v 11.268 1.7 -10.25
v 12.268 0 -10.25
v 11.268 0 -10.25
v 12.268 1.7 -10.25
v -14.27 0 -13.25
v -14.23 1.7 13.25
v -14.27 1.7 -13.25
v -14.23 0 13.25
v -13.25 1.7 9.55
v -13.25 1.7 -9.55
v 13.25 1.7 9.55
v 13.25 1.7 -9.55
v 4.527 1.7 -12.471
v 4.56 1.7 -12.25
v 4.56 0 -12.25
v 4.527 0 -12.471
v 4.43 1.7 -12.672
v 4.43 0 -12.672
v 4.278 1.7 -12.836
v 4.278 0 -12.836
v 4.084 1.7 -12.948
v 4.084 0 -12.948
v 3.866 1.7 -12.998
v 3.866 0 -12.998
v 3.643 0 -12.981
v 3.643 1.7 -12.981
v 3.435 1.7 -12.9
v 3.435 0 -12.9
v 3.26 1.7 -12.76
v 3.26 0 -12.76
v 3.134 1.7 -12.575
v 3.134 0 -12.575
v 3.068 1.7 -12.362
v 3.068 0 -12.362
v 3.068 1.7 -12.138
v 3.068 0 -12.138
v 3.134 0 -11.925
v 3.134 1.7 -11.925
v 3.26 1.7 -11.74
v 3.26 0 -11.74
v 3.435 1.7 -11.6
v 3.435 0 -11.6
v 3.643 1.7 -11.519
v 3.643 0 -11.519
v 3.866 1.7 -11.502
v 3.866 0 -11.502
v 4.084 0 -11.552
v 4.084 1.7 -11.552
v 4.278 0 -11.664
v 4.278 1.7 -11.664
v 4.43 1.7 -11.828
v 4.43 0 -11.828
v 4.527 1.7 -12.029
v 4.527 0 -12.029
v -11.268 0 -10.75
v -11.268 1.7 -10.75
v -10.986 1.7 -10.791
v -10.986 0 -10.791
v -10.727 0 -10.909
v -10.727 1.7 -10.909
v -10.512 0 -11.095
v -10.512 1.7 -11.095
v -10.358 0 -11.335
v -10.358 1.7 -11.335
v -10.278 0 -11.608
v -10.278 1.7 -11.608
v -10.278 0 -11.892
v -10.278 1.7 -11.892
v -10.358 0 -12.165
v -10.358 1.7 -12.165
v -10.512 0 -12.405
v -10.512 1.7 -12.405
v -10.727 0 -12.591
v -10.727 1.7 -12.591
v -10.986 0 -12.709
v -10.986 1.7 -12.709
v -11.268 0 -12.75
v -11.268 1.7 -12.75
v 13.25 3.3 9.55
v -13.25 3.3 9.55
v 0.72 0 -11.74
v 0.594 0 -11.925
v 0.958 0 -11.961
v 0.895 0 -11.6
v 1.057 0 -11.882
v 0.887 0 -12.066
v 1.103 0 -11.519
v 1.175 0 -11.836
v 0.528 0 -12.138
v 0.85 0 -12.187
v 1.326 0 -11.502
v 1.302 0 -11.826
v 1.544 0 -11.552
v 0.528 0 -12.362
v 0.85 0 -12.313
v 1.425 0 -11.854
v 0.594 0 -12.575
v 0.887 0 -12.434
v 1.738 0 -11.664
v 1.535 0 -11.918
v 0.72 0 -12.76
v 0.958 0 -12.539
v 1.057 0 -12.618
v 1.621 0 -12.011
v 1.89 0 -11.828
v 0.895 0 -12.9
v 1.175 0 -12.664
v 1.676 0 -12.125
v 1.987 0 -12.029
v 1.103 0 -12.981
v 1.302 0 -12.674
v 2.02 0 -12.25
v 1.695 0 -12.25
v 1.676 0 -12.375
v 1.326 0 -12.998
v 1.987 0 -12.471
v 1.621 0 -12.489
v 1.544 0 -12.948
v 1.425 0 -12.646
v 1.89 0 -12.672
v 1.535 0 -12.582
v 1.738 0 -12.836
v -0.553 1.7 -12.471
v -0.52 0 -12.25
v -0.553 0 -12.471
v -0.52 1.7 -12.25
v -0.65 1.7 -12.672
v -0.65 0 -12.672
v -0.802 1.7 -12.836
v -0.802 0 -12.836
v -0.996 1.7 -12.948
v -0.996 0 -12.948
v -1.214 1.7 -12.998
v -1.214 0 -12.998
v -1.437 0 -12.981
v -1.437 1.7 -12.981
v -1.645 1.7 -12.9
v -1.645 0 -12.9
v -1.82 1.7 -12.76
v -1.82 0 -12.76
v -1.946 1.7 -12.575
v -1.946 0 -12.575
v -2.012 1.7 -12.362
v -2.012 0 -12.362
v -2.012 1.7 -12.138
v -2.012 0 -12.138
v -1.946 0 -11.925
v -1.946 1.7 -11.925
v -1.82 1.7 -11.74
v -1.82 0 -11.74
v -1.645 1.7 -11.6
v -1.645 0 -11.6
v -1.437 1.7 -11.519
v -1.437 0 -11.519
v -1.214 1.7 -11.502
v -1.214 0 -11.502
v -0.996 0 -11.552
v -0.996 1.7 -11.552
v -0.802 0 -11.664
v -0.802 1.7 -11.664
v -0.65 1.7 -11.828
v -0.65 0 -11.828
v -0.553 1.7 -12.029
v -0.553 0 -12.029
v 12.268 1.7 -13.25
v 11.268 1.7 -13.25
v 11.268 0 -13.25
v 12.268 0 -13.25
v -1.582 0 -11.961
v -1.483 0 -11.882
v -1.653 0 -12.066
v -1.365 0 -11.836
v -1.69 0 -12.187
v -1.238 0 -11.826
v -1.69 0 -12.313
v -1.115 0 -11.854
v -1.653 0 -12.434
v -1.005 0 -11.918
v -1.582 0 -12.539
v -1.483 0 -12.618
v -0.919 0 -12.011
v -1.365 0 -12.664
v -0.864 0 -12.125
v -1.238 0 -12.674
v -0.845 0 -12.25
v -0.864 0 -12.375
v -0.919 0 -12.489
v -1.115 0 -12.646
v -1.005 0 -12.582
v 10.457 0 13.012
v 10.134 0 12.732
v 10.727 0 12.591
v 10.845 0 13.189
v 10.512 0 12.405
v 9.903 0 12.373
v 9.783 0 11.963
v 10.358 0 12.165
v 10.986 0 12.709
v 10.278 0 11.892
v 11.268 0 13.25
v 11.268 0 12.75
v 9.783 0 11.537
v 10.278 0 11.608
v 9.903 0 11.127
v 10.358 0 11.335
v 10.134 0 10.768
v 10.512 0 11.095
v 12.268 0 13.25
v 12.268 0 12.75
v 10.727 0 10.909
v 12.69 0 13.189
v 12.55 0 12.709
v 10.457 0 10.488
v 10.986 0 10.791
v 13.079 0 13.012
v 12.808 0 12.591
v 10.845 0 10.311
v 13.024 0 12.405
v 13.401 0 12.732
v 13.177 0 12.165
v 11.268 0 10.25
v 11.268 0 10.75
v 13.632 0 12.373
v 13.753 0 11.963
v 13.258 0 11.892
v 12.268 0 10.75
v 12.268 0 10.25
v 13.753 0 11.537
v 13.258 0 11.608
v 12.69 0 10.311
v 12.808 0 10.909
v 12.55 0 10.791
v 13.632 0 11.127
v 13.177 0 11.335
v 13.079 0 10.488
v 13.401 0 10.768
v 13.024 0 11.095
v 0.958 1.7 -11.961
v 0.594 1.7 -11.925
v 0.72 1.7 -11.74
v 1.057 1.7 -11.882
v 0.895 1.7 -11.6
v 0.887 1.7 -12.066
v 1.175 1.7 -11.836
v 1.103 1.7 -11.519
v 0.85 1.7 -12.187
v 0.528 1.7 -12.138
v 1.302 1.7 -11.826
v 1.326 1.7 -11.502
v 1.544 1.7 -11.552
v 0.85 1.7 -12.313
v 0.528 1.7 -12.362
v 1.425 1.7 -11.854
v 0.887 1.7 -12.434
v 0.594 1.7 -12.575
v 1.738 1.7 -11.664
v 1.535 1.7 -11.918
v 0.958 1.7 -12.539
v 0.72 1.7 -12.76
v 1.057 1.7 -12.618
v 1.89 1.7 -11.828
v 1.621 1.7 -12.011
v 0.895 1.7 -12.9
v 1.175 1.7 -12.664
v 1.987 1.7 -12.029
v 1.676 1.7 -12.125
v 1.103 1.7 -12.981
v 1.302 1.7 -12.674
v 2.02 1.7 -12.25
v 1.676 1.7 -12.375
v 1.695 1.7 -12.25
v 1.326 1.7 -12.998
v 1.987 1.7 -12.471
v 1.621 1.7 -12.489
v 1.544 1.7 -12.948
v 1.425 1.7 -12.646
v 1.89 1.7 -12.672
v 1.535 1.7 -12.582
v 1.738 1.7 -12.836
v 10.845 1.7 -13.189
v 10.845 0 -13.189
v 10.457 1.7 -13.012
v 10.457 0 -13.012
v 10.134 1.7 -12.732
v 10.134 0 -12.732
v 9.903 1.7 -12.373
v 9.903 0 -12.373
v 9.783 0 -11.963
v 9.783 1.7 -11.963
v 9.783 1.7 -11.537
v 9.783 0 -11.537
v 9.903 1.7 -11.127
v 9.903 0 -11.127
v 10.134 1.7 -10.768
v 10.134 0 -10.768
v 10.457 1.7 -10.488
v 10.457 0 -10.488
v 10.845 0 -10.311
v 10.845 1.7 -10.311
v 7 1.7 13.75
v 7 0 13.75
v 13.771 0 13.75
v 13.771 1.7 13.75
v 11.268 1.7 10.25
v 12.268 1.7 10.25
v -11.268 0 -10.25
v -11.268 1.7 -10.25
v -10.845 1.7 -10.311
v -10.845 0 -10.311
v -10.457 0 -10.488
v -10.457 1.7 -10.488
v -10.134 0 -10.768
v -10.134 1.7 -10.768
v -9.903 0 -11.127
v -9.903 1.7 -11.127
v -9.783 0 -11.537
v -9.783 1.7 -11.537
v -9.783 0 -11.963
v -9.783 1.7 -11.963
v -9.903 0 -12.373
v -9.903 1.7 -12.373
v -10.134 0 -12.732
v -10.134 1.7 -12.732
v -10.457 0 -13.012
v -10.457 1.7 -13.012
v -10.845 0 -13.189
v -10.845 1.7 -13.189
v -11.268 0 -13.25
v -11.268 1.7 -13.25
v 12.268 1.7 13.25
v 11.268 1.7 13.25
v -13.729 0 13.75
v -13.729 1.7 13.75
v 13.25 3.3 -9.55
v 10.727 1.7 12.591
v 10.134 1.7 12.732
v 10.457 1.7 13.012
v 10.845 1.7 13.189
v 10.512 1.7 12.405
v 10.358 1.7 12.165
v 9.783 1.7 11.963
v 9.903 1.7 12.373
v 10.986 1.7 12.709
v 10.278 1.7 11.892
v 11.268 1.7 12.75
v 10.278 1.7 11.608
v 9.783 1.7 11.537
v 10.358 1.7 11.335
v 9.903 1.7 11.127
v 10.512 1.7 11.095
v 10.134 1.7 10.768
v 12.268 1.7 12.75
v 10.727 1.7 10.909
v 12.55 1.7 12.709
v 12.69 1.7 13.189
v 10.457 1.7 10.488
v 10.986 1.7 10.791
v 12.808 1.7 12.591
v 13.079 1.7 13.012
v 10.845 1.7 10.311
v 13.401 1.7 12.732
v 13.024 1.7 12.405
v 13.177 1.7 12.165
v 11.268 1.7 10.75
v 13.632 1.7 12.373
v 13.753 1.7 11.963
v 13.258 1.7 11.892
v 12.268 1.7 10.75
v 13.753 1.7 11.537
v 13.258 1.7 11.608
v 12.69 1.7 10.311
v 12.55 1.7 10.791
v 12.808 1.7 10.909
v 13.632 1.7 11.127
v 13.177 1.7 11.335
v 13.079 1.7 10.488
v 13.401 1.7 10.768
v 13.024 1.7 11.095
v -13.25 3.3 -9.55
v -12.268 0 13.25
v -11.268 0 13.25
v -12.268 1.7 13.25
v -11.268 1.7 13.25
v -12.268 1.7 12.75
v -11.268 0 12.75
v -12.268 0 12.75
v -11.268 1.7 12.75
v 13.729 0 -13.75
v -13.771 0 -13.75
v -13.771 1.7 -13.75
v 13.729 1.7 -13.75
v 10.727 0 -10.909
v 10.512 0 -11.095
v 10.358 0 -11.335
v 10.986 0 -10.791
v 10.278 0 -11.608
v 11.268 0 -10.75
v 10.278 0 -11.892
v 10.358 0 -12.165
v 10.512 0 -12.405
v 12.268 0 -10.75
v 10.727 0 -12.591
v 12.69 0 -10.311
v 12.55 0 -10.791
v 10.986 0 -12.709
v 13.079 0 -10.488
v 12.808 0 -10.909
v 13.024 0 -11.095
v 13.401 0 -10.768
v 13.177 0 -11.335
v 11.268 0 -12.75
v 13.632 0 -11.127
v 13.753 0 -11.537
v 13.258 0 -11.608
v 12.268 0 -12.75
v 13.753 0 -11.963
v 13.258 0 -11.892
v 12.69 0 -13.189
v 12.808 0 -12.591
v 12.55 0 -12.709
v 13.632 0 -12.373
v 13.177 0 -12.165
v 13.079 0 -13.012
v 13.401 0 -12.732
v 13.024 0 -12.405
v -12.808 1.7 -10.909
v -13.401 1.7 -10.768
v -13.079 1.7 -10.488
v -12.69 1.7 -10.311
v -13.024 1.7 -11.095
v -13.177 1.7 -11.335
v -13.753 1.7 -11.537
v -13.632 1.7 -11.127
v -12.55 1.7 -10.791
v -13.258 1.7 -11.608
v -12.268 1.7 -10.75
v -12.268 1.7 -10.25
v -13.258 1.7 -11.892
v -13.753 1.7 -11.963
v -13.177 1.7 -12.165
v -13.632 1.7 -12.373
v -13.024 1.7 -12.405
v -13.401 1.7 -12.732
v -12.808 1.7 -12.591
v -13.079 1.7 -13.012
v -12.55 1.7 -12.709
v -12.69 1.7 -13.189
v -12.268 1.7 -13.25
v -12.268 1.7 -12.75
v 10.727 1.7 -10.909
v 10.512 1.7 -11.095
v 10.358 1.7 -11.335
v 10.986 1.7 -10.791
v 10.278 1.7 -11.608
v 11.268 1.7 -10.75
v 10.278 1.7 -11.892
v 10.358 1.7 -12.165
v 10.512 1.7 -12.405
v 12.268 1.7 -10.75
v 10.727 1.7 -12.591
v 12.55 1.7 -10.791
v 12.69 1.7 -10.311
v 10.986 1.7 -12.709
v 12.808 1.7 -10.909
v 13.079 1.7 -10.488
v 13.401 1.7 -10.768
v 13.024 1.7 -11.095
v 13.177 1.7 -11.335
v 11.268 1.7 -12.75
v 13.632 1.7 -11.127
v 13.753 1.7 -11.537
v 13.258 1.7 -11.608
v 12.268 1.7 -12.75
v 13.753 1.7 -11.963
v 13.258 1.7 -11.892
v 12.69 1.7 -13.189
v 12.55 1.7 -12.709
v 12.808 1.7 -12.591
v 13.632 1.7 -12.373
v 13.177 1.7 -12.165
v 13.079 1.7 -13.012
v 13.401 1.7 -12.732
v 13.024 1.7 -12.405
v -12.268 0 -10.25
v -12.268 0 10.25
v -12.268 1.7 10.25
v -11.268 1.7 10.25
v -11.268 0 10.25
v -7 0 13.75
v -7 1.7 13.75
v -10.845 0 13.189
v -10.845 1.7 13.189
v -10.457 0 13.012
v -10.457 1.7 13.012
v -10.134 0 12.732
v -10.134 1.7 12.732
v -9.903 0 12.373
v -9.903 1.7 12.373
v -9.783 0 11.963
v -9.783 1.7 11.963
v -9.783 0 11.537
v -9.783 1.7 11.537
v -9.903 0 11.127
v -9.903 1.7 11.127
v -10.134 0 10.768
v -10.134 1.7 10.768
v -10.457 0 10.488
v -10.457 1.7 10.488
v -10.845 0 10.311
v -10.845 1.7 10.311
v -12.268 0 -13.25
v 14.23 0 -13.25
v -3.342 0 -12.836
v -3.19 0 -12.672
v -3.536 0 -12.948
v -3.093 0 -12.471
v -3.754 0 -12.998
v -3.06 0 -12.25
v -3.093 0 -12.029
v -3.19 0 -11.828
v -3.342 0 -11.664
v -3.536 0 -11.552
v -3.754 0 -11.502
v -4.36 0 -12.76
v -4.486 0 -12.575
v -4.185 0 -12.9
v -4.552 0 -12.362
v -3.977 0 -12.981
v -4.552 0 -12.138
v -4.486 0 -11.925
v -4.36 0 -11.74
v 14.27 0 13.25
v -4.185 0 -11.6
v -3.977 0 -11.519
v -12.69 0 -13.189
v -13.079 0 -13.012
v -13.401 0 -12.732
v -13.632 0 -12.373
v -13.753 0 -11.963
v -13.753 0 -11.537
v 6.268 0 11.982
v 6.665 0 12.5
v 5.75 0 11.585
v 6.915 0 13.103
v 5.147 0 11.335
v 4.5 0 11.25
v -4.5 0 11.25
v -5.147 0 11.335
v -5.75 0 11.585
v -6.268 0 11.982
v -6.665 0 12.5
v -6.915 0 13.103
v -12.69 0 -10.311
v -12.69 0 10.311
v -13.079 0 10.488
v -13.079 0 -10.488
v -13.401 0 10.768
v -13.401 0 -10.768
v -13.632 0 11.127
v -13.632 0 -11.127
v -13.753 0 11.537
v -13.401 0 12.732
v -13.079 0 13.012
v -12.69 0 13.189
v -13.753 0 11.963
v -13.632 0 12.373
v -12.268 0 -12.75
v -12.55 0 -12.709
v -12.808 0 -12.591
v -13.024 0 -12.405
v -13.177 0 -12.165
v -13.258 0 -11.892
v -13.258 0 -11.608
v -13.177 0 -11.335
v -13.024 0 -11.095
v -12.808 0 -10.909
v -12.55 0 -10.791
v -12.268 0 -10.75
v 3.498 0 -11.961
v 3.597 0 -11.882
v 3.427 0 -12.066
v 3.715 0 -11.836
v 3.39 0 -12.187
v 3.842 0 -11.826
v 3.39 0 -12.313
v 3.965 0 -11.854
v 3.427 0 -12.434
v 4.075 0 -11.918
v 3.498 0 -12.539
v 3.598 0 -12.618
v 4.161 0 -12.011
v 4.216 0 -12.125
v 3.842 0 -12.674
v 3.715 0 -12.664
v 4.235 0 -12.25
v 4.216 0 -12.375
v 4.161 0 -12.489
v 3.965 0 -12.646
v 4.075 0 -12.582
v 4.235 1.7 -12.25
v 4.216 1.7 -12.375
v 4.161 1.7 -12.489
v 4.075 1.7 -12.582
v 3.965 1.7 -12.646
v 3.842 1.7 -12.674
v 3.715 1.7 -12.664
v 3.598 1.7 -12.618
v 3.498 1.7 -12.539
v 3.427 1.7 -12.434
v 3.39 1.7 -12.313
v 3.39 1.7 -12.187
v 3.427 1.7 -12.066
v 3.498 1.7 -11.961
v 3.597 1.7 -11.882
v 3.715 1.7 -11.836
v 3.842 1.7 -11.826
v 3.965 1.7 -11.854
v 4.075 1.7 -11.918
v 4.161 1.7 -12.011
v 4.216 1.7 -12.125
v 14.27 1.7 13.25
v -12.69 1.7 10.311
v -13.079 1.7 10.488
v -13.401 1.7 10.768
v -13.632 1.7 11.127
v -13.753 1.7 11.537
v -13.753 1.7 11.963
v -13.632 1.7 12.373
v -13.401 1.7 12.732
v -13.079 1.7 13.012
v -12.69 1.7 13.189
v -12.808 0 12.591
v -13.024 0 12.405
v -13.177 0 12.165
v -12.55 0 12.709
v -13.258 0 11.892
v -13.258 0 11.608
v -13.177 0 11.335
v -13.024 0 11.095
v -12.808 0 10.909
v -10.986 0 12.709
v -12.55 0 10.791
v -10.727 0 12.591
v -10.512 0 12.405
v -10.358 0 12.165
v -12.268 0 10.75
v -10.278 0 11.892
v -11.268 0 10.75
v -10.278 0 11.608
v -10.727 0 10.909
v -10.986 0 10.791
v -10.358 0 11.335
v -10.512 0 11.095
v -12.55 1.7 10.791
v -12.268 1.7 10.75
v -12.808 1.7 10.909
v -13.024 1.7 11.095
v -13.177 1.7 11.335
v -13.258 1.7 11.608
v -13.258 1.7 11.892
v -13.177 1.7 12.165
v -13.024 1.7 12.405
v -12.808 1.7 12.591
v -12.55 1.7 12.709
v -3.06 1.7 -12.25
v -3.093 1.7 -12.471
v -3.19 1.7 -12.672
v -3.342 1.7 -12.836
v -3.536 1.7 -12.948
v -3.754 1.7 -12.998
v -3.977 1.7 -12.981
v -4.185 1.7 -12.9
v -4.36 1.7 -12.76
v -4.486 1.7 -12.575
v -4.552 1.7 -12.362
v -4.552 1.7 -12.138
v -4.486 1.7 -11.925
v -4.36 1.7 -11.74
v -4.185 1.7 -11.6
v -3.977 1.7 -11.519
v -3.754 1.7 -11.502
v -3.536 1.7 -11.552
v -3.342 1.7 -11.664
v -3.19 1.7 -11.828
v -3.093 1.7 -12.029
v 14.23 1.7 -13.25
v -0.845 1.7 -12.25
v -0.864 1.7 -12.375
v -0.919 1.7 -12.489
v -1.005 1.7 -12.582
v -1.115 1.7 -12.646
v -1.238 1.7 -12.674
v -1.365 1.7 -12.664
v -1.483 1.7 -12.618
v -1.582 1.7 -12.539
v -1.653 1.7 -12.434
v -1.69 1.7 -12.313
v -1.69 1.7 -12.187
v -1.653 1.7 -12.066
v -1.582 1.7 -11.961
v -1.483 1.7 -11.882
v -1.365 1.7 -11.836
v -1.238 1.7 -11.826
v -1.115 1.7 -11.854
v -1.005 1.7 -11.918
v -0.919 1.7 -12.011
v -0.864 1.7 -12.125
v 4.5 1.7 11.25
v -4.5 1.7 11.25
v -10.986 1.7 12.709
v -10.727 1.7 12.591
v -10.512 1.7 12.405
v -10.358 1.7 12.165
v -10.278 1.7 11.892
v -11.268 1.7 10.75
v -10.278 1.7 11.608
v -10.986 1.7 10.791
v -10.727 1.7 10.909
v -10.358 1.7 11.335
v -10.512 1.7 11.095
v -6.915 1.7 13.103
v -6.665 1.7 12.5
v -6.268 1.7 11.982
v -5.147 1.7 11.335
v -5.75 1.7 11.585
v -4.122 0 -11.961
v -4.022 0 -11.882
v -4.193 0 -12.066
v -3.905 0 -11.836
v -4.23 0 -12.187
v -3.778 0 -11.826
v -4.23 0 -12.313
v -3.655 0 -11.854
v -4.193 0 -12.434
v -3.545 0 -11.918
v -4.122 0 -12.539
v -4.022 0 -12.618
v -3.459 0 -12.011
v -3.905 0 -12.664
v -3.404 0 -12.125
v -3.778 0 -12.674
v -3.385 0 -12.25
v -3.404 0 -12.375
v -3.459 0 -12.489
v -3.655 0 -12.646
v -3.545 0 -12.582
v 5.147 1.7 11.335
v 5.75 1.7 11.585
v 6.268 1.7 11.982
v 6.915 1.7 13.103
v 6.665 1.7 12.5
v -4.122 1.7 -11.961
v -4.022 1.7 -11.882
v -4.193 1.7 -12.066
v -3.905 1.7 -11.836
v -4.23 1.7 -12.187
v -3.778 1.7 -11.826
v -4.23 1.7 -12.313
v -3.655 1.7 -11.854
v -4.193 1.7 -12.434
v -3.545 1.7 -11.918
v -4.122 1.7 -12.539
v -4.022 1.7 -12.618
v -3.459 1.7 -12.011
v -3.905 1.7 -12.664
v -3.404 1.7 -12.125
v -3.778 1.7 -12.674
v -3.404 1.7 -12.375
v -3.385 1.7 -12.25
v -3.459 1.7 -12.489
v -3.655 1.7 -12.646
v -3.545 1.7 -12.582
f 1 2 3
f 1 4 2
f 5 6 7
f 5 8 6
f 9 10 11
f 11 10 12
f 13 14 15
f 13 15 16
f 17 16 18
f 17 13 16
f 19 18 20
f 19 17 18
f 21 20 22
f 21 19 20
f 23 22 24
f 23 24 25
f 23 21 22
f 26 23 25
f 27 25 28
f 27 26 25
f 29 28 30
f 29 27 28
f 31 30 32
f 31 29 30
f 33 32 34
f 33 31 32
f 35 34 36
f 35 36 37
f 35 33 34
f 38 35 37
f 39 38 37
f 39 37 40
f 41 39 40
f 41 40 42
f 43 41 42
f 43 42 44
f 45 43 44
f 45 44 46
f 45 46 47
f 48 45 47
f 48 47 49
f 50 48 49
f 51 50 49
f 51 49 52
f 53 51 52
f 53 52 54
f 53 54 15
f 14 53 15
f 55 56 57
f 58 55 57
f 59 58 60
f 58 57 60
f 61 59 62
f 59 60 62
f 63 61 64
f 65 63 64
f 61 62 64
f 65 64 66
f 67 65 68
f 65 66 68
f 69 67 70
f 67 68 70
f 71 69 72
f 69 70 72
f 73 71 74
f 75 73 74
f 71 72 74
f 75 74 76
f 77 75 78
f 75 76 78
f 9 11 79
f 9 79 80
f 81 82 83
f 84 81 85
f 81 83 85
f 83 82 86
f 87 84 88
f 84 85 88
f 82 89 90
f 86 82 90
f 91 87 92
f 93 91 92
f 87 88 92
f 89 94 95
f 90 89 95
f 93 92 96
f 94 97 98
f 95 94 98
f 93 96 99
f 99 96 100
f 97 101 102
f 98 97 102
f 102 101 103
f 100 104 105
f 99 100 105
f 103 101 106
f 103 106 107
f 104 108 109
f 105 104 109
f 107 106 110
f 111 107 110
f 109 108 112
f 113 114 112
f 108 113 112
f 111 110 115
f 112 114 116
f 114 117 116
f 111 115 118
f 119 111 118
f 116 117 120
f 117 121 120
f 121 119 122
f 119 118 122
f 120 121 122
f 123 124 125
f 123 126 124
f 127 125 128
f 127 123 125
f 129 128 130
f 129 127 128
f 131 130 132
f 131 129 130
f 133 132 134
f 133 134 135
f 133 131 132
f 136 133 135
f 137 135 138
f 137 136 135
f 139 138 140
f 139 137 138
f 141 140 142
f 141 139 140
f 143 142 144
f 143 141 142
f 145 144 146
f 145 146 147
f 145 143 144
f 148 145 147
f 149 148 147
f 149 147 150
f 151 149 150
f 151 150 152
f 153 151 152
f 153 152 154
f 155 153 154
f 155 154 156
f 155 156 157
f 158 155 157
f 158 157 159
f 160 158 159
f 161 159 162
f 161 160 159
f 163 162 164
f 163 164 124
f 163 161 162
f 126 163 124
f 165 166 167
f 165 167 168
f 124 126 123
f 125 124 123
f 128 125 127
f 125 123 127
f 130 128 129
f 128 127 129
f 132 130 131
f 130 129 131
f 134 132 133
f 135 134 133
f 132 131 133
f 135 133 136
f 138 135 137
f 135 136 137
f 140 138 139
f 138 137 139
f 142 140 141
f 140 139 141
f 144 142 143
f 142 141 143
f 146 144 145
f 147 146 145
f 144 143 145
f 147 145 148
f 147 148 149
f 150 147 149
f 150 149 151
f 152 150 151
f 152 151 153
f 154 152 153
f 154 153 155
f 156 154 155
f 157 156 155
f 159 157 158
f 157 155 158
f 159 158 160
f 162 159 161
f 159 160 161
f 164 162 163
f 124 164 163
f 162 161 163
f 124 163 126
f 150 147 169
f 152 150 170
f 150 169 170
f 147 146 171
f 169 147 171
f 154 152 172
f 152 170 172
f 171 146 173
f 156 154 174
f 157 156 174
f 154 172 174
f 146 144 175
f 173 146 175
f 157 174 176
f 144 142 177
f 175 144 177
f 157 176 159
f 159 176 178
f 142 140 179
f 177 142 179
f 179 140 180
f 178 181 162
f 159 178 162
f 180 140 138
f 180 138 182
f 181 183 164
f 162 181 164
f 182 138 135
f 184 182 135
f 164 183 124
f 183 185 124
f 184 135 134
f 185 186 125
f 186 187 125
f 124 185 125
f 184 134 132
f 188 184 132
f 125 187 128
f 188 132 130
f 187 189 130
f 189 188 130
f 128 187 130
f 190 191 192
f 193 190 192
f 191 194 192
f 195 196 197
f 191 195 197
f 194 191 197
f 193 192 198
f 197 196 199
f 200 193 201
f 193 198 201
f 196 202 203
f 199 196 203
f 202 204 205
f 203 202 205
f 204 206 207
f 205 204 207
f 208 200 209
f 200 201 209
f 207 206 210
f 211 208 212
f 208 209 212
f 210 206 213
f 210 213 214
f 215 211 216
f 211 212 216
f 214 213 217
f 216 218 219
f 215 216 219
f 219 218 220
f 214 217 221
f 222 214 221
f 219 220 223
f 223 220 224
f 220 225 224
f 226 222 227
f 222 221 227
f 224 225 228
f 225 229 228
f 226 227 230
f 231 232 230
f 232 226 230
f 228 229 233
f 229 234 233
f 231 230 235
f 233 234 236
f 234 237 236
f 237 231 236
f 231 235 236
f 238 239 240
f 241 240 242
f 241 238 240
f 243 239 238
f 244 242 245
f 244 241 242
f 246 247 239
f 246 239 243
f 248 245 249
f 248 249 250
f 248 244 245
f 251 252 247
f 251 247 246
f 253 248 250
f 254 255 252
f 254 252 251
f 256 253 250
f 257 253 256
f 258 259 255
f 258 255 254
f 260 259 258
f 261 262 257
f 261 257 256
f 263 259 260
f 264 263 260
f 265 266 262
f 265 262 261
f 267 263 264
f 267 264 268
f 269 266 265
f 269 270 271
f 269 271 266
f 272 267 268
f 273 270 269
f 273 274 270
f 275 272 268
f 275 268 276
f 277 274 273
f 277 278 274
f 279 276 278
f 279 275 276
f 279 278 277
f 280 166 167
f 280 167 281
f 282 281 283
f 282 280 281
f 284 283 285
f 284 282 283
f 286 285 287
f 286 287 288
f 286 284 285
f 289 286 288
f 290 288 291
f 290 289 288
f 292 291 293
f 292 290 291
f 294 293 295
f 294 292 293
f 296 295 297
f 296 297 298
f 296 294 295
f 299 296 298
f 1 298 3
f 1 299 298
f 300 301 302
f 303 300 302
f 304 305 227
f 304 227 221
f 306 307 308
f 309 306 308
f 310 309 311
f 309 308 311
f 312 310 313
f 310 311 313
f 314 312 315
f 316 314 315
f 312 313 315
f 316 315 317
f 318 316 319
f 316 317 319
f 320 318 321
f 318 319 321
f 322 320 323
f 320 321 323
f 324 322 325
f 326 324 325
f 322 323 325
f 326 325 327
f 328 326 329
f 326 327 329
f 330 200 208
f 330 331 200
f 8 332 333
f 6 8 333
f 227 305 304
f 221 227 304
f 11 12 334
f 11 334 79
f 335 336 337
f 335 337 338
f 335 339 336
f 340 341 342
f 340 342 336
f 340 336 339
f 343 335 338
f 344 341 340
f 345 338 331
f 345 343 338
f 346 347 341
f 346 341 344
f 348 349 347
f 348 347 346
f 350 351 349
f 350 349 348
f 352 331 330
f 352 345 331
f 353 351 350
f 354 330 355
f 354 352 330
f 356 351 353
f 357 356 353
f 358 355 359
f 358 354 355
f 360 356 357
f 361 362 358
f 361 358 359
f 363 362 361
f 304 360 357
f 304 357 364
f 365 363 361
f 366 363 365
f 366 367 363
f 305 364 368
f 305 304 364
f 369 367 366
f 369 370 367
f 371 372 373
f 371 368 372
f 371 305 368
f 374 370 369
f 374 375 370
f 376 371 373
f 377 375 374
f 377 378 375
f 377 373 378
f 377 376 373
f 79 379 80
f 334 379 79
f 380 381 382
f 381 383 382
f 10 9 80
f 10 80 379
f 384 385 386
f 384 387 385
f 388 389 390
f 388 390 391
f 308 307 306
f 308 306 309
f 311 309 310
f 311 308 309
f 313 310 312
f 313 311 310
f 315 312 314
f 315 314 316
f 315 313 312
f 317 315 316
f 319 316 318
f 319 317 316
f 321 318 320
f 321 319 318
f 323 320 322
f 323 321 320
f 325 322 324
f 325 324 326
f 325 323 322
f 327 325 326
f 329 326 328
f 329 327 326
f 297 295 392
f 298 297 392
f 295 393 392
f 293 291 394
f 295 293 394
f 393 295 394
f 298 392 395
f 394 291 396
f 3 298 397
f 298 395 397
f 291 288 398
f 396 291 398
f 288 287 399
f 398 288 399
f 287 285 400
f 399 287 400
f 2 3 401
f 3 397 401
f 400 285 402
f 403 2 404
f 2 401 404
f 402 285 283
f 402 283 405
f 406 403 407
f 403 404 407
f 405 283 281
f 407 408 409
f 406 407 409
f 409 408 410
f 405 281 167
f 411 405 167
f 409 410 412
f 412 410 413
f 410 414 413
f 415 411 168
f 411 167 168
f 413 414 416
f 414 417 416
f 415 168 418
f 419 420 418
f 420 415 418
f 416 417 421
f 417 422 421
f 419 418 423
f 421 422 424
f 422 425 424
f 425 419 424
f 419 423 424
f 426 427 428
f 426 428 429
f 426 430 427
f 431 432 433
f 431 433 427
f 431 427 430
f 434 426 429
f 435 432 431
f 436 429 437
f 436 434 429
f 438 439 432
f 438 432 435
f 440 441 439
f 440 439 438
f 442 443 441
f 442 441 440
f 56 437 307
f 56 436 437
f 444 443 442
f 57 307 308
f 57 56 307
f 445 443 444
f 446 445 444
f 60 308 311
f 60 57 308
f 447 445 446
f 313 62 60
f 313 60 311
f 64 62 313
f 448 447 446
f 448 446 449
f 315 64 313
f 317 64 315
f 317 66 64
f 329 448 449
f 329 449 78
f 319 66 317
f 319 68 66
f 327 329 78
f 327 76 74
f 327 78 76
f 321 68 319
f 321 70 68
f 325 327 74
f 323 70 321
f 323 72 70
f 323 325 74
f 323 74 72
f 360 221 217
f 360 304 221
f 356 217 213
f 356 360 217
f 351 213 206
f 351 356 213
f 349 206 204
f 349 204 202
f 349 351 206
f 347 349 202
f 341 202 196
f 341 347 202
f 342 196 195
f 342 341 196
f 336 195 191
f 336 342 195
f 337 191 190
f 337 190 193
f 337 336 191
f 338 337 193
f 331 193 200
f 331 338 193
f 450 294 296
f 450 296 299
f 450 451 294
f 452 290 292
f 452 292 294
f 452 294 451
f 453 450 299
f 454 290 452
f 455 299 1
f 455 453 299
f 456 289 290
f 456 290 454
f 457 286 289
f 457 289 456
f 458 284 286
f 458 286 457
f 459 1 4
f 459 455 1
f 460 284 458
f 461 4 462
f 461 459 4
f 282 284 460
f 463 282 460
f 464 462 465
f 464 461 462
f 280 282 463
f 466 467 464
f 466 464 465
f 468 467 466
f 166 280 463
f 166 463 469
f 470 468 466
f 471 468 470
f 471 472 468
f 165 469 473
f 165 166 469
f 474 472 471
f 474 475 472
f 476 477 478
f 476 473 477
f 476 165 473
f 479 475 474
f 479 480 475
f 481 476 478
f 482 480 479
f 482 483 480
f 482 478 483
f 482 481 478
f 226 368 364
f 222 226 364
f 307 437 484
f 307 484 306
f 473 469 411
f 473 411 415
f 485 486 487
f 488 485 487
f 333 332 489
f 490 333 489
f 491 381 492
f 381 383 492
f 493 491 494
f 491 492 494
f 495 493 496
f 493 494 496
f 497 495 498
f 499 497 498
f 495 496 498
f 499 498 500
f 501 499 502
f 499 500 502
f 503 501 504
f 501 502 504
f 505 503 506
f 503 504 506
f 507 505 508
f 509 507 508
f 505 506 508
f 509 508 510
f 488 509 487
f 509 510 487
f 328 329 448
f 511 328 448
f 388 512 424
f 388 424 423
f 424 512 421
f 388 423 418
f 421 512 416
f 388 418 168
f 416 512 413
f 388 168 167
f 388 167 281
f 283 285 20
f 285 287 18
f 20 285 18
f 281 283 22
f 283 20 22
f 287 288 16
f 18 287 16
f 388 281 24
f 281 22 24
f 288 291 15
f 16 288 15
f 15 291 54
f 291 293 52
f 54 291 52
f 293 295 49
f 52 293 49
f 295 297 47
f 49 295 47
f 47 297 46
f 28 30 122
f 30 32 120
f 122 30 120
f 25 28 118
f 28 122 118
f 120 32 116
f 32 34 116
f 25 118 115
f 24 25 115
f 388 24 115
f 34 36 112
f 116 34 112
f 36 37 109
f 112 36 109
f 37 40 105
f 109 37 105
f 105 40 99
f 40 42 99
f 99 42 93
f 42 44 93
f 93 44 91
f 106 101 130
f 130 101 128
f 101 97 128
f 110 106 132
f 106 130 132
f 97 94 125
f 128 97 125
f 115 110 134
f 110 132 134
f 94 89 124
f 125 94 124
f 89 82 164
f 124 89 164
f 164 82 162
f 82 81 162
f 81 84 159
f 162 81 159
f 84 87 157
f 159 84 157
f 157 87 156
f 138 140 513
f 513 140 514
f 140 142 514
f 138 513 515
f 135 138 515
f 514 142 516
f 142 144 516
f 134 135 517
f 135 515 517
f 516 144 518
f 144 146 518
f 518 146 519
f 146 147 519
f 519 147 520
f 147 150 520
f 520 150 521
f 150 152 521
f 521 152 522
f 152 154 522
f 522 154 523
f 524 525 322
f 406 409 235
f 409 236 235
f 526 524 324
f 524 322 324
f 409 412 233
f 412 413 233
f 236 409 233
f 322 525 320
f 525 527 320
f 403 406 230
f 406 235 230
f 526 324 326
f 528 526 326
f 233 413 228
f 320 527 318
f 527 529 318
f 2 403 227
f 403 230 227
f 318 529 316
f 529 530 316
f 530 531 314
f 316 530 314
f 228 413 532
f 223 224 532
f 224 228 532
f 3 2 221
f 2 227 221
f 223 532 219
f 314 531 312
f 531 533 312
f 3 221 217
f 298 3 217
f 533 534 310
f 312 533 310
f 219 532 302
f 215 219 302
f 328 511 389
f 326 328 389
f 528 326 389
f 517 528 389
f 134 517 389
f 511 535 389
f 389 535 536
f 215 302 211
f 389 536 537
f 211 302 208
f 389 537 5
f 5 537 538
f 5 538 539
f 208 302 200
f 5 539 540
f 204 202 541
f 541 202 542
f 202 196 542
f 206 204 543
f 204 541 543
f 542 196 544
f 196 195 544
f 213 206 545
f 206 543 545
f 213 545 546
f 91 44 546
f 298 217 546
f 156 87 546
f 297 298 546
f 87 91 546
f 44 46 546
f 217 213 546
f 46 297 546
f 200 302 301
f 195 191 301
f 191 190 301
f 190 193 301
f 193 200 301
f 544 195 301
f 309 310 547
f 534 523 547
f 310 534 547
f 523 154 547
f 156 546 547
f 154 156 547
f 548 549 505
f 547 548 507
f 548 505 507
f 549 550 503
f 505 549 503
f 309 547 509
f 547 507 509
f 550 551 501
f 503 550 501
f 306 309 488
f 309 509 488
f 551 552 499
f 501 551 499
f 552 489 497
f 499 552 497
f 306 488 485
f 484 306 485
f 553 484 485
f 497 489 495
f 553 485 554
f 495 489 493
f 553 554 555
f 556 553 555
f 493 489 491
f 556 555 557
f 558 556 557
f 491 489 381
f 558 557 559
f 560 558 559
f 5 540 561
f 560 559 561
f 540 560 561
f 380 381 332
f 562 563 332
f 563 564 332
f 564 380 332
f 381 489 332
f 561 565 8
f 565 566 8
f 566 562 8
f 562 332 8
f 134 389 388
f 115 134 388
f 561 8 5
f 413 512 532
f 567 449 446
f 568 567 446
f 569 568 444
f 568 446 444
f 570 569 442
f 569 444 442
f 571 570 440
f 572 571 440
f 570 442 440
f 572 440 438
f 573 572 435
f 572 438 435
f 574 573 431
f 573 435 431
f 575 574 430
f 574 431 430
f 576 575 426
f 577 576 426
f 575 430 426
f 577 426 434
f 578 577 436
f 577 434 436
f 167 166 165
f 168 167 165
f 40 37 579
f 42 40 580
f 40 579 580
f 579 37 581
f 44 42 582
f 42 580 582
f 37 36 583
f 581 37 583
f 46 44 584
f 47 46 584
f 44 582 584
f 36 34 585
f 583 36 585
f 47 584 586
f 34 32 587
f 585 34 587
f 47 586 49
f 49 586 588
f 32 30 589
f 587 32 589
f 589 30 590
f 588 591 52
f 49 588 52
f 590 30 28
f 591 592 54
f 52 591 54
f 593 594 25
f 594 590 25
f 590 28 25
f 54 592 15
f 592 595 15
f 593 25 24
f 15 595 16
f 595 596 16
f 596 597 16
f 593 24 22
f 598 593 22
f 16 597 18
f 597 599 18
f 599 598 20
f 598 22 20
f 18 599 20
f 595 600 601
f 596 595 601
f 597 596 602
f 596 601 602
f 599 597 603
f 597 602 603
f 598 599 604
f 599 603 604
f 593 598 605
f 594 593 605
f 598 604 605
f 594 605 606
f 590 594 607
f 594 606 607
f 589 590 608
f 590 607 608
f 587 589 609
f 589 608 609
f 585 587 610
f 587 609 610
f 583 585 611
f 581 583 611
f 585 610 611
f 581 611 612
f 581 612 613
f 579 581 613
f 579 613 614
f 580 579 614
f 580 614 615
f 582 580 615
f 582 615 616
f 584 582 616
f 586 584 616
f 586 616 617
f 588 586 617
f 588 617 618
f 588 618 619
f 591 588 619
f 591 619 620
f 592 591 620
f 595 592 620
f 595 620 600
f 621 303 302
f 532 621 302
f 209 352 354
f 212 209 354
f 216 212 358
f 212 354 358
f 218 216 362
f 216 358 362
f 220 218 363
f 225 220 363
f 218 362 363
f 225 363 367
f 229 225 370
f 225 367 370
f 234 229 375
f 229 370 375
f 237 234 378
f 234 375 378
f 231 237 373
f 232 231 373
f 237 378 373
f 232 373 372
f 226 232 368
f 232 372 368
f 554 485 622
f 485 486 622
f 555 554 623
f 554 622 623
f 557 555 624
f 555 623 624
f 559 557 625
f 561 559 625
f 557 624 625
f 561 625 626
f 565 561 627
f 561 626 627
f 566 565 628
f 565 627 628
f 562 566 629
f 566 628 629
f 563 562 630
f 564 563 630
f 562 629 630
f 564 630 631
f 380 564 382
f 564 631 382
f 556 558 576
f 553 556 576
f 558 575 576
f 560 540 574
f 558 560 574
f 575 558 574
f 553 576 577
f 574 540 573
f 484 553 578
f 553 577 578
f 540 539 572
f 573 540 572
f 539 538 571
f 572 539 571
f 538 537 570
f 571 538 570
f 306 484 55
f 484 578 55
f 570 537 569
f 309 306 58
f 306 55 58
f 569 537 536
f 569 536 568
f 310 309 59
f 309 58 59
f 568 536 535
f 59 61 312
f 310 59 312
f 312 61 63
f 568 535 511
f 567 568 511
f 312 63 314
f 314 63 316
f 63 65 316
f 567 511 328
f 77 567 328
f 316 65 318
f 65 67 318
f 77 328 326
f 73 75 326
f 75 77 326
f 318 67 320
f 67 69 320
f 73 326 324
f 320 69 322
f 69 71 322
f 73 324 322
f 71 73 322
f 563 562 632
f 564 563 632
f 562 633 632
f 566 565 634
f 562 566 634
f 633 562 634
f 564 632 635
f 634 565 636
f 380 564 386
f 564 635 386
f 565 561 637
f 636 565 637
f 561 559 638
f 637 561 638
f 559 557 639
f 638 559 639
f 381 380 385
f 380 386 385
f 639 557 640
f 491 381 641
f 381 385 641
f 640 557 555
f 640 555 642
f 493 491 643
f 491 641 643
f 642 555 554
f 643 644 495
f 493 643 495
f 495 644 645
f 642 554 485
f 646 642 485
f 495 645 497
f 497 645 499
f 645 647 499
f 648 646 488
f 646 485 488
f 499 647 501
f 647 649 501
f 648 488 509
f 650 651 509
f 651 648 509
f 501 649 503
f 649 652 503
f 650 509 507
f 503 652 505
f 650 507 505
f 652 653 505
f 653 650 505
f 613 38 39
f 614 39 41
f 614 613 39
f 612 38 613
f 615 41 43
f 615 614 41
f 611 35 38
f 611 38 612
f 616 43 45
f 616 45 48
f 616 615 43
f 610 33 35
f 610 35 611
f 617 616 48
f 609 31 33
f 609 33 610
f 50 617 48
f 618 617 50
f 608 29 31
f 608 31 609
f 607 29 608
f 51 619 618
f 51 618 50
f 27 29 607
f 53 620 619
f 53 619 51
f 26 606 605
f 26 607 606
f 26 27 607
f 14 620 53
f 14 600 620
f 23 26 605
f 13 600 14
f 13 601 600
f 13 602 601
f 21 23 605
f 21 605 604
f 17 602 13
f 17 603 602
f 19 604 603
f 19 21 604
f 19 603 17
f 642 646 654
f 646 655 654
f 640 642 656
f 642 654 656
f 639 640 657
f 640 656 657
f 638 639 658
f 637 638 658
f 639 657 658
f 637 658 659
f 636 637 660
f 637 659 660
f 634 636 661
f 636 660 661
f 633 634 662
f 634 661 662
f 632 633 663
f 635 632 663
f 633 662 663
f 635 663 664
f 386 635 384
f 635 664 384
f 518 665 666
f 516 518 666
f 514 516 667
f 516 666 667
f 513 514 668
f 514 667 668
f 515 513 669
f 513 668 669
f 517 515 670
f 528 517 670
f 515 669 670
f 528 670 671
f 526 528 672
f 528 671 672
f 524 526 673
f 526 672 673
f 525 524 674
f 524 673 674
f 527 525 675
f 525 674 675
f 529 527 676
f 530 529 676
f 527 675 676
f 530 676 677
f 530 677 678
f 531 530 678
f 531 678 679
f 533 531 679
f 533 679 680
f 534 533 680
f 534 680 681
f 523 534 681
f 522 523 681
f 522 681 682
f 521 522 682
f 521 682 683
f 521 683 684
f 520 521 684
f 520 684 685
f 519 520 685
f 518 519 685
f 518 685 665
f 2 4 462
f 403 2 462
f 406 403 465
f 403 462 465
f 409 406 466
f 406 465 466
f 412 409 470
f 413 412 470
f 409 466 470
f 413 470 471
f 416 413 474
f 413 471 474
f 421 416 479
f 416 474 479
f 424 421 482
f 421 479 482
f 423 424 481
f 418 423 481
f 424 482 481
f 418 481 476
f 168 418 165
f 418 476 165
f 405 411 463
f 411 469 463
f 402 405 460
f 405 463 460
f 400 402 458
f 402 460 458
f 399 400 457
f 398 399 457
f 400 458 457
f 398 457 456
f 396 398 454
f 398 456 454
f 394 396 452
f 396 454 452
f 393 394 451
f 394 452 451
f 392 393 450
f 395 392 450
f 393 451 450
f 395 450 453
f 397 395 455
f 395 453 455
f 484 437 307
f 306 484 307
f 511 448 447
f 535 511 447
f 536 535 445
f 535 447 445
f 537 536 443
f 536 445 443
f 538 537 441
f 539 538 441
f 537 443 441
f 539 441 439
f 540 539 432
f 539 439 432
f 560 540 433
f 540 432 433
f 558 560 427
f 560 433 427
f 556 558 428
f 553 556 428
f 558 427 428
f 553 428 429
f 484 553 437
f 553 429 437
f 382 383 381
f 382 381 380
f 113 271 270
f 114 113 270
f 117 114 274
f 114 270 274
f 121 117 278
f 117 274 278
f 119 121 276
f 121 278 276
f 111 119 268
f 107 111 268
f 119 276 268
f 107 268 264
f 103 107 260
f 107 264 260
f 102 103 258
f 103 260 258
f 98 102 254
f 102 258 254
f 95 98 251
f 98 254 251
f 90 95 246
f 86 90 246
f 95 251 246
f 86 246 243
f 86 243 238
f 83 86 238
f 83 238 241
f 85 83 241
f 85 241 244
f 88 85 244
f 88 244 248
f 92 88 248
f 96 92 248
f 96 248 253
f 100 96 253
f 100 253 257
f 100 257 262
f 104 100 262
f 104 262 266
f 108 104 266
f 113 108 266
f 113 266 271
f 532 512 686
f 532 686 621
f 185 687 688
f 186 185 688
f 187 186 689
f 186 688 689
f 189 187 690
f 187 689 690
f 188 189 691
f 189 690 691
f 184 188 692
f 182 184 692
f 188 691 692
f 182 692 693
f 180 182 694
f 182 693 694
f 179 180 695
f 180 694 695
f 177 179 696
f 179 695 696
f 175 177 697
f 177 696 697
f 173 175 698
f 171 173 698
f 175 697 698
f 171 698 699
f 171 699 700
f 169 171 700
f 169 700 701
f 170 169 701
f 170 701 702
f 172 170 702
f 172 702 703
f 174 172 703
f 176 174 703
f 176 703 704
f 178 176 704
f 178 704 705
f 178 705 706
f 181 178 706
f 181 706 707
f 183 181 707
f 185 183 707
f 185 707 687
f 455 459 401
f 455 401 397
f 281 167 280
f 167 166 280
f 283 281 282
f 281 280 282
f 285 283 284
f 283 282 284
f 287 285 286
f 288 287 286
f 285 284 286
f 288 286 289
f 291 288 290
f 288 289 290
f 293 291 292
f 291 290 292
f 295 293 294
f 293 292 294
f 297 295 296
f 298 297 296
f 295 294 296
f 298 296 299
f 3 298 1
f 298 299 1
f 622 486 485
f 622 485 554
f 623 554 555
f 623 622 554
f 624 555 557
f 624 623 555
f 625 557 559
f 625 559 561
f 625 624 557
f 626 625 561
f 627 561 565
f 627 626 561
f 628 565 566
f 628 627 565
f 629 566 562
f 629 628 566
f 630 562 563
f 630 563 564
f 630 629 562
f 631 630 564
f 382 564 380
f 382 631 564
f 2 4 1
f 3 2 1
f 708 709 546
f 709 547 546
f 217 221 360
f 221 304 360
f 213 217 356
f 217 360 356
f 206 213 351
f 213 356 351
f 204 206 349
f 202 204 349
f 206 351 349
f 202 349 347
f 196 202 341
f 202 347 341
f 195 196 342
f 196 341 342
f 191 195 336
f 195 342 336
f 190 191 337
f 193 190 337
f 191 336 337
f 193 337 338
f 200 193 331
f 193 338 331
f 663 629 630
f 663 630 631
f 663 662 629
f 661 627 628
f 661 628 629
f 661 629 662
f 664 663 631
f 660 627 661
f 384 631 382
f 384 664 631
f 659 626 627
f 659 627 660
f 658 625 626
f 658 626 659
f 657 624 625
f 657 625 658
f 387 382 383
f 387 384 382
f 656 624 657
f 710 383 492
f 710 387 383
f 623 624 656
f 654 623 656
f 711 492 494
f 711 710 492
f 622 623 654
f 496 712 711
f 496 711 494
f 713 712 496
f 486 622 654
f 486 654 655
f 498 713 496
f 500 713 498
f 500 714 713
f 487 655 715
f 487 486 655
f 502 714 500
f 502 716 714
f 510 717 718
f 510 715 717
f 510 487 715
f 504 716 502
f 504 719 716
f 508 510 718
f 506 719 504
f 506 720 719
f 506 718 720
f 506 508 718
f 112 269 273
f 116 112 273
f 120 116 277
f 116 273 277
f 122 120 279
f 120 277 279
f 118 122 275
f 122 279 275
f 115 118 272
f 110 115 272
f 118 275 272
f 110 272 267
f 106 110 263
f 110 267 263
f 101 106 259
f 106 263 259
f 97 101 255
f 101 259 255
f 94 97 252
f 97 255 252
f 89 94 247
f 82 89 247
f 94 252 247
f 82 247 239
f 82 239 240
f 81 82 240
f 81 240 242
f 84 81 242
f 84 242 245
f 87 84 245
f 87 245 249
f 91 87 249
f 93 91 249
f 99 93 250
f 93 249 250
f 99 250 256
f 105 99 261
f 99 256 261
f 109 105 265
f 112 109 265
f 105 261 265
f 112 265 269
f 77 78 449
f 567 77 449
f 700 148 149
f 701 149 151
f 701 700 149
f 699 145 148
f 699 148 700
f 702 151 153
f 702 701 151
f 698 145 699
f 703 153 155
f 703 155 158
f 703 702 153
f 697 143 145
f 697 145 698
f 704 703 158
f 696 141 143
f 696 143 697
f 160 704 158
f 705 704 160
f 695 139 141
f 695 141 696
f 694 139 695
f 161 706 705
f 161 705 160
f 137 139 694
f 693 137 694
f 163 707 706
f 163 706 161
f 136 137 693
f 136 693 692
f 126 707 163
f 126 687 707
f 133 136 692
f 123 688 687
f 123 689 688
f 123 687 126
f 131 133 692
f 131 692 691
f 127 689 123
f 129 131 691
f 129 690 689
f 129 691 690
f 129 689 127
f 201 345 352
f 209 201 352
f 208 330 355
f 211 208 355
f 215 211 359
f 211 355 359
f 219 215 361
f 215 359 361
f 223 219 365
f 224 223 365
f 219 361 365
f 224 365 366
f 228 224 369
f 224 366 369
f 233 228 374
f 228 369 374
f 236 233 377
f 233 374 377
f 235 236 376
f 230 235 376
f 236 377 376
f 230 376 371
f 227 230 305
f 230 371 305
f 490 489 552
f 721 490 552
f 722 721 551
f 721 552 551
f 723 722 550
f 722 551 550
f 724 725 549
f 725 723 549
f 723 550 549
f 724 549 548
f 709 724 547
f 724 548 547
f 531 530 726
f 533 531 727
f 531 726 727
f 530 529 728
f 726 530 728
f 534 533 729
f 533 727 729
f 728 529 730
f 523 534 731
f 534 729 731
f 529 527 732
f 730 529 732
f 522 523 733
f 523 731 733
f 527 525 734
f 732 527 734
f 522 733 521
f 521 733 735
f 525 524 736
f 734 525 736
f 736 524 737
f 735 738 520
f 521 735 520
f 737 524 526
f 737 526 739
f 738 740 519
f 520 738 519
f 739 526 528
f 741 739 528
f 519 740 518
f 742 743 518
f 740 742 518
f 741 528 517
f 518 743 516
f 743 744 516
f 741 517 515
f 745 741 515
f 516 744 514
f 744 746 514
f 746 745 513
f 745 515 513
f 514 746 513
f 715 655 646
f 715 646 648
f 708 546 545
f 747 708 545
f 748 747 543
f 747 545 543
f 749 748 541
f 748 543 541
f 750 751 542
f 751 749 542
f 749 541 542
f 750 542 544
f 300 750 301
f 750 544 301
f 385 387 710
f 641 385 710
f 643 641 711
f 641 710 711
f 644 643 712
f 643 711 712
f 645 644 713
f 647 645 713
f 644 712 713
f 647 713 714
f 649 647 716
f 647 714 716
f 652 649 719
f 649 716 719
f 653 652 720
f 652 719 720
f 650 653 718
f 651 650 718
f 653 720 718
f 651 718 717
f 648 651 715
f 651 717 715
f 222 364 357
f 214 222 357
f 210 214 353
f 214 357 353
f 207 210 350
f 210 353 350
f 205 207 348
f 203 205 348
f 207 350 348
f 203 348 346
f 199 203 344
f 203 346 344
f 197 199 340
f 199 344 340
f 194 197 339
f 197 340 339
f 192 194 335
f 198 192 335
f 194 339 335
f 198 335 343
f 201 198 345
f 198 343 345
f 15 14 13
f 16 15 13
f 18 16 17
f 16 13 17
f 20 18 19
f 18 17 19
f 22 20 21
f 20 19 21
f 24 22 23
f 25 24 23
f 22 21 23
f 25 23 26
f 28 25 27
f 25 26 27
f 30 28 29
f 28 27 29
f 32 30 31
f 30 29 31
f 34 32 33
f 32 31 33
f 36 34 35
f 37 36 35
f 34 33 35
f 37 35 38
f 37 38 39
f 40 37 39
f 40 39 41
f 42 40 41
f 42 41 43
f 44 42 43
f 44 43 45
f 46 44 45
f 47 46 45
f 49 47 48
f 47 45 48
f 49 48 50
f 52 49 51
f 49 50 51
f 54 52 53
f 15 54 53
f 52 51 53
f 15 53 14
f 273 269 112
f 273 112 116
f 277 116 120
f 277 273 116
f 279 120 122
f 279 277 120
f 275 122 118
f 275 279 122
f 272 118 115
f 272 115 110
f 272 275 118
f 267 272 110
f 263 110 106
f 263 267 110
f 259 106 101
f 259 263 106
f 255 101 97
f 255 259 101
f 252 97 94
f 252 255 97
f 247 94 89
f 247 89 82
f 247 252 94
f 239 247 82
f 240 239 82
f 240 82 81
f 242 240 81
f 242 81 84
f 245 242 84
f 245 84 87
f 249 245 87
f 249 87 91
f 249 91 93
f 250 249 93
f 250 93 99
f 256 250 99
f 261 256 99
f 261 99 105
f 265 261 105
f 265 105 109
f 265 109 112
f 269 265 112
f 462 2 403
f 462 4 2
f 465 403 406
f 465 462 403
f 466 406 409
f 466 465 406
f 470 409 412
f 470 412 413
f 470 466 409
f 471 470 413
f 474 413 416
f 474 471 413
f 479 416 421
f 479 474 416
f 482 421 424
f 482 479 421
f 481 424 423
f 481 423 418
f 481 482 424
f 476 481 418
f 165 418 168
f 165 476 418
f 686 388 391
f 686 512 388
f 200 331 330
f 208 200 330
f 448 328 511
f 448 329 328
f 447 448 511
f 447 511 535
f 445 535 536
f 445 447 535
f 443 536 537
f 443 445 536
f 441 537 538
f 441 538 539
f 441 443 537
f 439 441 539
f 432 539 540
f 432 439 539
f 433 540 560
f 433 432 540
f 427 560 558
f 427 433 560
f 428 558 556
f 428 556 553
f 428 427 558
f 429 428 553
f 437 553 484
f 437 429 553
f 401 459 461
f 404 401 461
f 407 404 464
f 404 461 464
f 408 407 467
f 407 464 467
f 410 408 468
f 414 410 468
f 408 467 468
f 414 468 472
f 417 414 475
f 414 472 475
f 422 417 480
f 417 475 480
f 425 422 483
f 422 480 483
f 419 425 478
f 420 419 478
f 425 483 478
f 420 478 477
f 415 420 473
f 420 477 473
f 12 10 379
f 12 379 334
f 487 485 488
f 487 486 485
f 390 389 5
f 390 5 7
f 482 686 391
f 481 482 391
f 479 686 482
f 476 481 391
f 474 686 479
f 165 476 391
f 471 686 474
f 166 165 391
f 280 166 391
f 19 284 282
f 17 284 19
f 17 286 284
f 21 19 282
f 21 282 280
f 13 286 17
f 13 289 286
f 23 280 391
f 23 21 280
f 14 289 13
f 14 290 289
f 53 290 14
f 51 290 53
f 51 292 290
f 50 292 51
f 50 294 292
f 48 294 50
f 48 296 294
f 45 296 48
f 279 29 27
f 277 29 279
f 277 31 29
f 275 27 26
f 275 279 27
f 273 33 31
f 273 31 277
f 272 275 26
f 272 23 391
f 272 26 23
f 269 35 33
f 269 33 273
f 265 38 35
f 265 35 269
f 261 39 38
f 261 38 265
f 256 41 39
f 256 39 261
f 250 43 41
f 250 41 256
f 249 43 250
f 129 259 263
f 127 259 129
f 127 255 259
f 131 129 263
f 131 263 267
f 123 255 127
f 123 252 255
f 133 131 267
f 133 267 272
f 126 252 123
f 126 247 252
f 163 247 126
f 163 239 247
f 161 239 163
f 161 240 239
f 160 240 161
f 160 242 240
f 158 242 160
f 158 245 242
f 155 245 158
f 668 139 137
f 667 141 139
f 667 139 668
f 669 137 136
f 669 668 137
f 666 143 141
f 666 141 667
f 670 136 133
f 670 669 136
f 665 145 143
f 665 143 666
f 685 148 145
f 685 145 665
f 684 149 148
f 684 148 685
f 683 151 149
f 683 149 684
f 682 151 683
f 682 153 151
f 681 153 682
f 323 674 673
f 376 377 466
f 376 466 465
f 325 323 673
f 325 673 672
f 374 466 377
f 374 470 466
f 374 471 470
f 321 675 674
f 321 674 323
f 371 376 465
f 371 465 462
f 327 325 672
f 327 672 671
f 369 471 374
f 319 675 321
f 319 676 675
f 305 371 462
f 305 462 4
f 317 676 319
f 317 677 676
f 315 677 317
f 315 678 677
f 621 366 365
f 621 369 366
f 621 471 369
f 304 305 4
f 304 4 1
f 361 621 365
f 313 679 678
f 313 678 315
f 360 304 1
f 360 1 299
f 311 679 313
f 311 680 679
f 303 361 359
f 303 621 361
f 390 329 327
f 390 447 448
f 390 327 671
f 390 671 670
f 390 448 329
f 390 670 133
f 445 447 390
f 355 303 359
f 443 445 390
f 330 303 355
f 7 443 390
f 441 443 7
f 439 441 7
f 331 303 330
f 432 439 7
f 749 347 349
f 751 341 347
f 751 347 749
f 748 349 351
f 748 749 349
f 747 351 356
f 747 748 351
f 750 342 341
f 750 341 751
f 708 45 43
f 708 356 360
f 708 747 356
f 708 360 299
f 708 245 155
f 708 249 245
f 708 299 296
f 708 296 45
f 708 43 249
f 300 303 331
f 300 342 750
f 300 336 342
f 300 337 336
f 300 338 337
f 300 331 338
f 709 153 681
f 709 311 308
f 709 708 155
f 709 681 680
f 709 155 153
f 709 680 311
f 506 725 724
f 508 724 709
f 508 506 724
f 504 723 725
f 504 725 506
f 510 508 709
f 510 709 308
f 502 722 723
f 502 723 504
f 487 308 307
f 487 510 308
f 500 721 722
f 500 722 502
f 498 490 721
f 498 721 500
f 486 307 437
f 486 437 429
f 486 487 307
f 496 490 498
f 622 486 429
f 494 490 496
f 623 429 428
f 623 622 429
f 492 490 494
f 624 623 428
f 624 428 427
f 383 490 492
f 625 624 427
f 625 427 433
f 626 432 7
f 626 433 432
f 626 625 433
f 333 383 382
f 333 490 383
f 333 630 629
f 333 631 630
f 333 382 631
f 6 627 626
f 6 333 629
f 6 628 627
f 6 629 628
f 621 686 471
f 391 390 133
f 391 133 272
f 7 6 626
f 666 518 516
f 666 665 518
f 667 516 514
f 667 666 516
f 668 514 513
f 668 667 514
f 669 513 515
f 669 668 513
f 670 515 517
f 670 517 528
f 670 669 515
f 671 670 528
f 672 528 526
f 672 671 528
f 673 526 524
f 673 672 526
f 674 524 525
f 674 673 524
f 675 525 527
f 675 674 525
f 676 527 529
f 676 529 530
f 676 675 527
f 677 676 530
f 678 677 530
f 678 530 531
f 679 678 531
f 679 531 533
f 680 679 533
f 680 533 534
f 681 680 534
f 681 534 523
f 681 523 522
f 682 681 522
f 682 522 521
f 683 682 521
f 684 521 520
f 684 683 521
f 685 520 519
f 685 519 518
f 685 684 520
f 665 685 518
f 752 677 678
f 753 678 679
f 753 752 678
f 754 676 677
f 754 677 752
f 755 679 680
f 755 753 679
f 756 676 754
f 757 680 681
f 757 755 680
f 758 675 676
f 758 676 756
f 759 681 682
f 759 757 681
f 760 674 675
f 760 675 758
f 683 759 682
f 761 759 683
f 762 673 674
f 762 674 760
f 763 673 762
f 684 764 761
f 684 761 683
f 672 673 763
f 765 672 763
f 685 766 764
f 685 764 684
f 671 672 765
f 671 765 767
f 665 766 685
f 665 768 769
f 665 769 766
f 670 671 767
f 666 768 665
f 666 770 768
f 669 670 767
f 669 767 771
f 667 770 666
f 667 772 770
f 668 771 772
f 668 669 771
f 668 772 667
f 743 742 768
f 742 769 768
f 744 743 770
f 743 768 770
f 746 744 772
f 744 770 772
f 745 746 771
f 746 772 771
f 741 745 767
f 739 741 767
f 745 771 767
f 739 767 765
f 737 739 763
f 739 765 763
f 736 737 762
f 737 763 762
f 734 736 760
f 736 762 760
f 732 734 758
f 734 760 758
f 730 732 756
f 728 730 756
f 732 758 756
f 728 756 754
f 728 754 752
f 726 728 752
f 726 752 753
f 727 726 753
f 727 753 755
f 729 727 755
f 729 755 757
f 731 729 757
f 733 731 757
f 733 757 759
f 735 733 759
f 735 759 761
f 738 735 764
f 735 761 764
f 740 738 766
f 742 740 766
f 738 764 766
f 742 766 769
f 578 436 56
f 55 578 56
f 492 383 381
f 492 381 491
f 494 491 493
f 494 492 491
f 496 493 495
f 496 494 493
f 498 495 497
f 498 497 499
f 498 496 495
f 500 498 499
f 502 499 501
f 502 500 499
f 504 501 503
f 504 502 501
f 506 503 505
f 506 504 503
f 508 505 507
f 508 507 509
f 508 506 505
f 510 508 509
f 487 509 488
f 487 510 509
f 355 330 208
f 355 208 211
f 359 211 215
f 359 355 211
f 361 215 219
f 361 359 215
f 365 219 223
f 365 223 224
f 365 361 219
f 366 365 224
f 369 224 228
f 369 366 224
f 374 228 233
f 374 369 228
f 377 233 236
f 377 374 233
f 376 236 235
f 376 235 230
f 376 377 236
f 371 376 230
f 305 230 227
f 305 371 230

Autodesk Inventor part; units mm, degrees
ref_plane "YZ Plane" through (0, 0, 0) normal (1, 0, 0) x (0, 1, 0)
ref_plane "XZ Plane" through (0, 0, 0) normal (0, 1, 0) x (-1, 0, 0)
ref_plane "XY Plane" through (0, 0, 0) normal (0, 0, 1) x (1, 0, 0)
sketch "Sketch1" plane through (0, 0, 0) normal (0, 1, 0) x (-1, 0, 0)
  line L0 (14.2292, 13.75) -> (14.2708, -13.75)
  line L1 (14.2708, -13.75) -> (-14.2292, -13.75)
  line L2 (-14.2292, -13.75) -> (-14.2708, 13.75)
  line L3 (-14.2708, 13.75) -> (14.2708, -13.75) construction
  line L4 (14.2292, 13.75) -> (-14.2292, -13.75) construction
  line L5 (14.2292, 13.75) -> (7, 13.75)
  line L6 (4.5, 11.25) -> (-4.5, 11.25)
  line L7 (-7, 13.75) -> (-14.2708, 13.75)
  arc A0 (-7, 13.75) -> (-4.5, 11.25) centre (-4.5, 13.75) ccw
  arc A1 (4.5, 11.25) -> (7, 13.75) centre (4.5, 13.75) ccw
  line L8 (0, 0) -> (0, -4.4345)
  line L9 (0, 11.25) -> (0, 7.5255)
  dimension "d0" = 28.5
  dimension "d1" = 27.5
  dimension "d2" = 2.5
  dimension "d3" = 14
extrude "Extrusion1" add sketch "Sketch1" along normal blind 1.7
chamfer "Chamfer1" distance 0.5 angle 45 4 edges at (14.2708, 0.85, 13.75) (-14.2292, 0.85, 13.75) (14.2292, 0.85, -13.75) (-14.2708, 0.85, -13.75)
sketch "Sketch2" plane through (0, 1.7, 0) normal (0, 1, 0) x (1, 0, 0)
  line L0 (-13.2678, 11.75) -> (-10.2678, 11.75) construction
  line L1 (-12.2678, 10.75) -> (-11.2678, 10.75)
  line L2 (-11.2678, 12.75) -> (-12.2678, 12.75)
  arc A0 (-12.2678, 12.75) -> (-12.2678, 10.75) centre (-12.2678, 11.75) ccw
  arc A1 (-11.2678, 10.75) -> (-11.2678, 12.75) centre (-11.2678, 11.75) ccw
  line L3 (-11.2678, 13.25) -> (-12.2678, 13.25)
  arc A2 (-12.2678, 13.25) -> (-12.2678, 10.25) centre (-12.2678, 11.75) ccw
  line L4 (-12.2678, 10.25) -> (-11.2678, 10.25)
  arc A3 (-11.2678, 10.25) -> (-11.2678, 13.25) centre (-11.2678, 11.75) ccw
  line L5 (13.7292, 13.75) -> (-13.7708, 13.75) projected
  line L6 (-14.2701, 13.25) -> (-14.2299, -13.25) projected
  line L7 (0, 0) -> (-2.3297, 0)
  line L8 (0, 0) -> (0, 4.8141)
  line L9 (13.2678, 11.75) -> (10.2678, 11.75) construction
  line L10 (12.2678, 10.75) -> (11.2678, 10.75)
  line L11 (11.2678, 12.75) -> (12.2678, 12.75)
  arc A4 (12.2678, 10.75) -> (12.2678, 12.75) centre (12.2678, 11.75) ccw
  arc A5 (11.2678, 12.75) -> (11.2678, 10.75) centre (11.2678, 11.75) ccw
  line L12 (11.2678, 13.25) -> (12.2678, 13.25)
  arc A6 (12.2678, 10.25) -> (12.2678, 13.25) centre (12.2678, 11.75) ccw
  line L13 (12.2678, 10.25) -> (11.2678, 10.25)
  arc A7 (11.2678, 13.25) -> (11.2678, 10.25) centre (11.2678, 11.75) ccw
  line L14 (-13.2678, -11.75) -> (-10.2678, -11.75) construction
  line L15 (-12.2678, -10.75) -> (-11.2678, -10.75)
  line L16 (-11.2678, -12.75) -> (-12.2678, -12.75)
  arc A8 (-12.2678, -10.75) -> (-12.2678, -12.75) centre (-12.2678, -11.75) ccw
  arc A9 (-11.2678, -12.75) -> (-11.2678, -10.75) centre (-11.2678, -11.75) ccw
  line L17 (-11.2678, -13.25) -> (-12.2678, -13.25)
  arc A10 (-12.2678, -10.25) -> (-12.2678, -13.25) centre (-12.2678, -11.75) ccw
  line L18 (-12.2678, -10.25) -> (-11.2678, -10.25)
  arc A11 (-11.2678, -13.25) -> (-11.2678, -10.25) centre (-11.2678, -11.75) ccw
  line L19 (12.2678, -10.25) -> (11.2678, -10.25)
  line L20 (12.2678, -10.75) -> (11.2678, -10.75)
  line L21 (11.2678, -12.75) -> (12.2678, -12.75)
  arc A12 (12.2678, -12.75) -> (12.2678, -10.75) centre (12.2678, -11.75) ccw
  arc A13 (11.2678, -10.75) -> (11.2678, -12.75) centre (11.2678, -11.75) ccw
  arc A14 (11.2678, -10.25) -> (11.2678, -13.25) centre (11.2678, -11.75) ccw
  arc A15 (12.2678, -13.25) -> (12.2678, -10.25) centre (12.2678, -11.75) ccw
  line L22 (11.2678, -13.25) -> (12.2678, -13.25)
  line L23 (13.2678, -11.75) -> (10.2678, -11.75) construction
  circle A16 centre (-3.81, 12.25) radius 0.75
  circle A17 centre (-1.27, 12.25) radius 0.75
  circle A18 centre (1.27, 12.25) radius 0.75
  circle A19 centre (3.81, 12.25) radius 0.75
  circle A20 centre (-3.81, 12.25) radius 0.425
  circle A21 centre (-1.27, 12.25) radius 0.425
  circle A22 centre (1.27, 12.25) radius 0.425
  circle A23 centre (3.81, 12.25) radius 0.425
  point P0 (-11.7678, 11.75)
  point P1 (11.7678, 11.75)
  point P2 (-11.7678, -11.75)
  point P3 (11.7678, -11.75)
  dimension "d9" = 3
  dimension "d10" = 2
  dimension "d11" = 0.5
  dimension "d12" = 0.5
  dimension "d13" = 2
  dimension "d22" = 2.54
  dimension "d23" = 2.54
  dimension "d24" = 2.54
  dimension "d25" = 1.5
  dimension "d26" = 0.85
  dimension "d27" = 1.5
extrude "Extrusion2" cut sketch "Sketch2" against normal through all contours A0 L2 A1 L1 | A3 L4 A2 L3 | L10 A5 L11 A4 | L12 A6 L13 A7 | L15 A9 L16 A8 | L17 A10 L18 A11 | A15 L22 A14 L19 | A12 L21 A13 L20 | A16 | A17 | A18 | A19 | A20 | A21 | A22 | A23
extrude "Extrusion3" add sketch "Sketch2" against normal up to surface (1.7 mm away) separate body
sketch "Sketch3" plane through (0, 1.7, 0) normal (0, 1, 0) x (1, 0, 0)
  line L0 (-13.25, 9.55) -> (13.25, 9.55)
  line L1 (13.25, 9.55) -> (13.25, -9.55)
  line L2 (13.25, -9.55) -> (-13.25, -9.55)
  line L3 (-13.25, -9.55) -> (-13.25, 9.55)
  line L4 (-13.25, 9.55) -> (13.25, -9.55) construction
  line L5 (13.25, 9.55) -> (-13.25, -9.55) construction
  point P0 (0, 0)
  point P1 (0, 0)
  point P2 (0, 0)
  point P3 (0, 0)
  dimension "d18" = 19.1
  dimension "d19" = 26.5
extrude "Extrusion4" add sketch "Sketch3" along normal blind 1.6 separate body
properties part number "SSD1306"
